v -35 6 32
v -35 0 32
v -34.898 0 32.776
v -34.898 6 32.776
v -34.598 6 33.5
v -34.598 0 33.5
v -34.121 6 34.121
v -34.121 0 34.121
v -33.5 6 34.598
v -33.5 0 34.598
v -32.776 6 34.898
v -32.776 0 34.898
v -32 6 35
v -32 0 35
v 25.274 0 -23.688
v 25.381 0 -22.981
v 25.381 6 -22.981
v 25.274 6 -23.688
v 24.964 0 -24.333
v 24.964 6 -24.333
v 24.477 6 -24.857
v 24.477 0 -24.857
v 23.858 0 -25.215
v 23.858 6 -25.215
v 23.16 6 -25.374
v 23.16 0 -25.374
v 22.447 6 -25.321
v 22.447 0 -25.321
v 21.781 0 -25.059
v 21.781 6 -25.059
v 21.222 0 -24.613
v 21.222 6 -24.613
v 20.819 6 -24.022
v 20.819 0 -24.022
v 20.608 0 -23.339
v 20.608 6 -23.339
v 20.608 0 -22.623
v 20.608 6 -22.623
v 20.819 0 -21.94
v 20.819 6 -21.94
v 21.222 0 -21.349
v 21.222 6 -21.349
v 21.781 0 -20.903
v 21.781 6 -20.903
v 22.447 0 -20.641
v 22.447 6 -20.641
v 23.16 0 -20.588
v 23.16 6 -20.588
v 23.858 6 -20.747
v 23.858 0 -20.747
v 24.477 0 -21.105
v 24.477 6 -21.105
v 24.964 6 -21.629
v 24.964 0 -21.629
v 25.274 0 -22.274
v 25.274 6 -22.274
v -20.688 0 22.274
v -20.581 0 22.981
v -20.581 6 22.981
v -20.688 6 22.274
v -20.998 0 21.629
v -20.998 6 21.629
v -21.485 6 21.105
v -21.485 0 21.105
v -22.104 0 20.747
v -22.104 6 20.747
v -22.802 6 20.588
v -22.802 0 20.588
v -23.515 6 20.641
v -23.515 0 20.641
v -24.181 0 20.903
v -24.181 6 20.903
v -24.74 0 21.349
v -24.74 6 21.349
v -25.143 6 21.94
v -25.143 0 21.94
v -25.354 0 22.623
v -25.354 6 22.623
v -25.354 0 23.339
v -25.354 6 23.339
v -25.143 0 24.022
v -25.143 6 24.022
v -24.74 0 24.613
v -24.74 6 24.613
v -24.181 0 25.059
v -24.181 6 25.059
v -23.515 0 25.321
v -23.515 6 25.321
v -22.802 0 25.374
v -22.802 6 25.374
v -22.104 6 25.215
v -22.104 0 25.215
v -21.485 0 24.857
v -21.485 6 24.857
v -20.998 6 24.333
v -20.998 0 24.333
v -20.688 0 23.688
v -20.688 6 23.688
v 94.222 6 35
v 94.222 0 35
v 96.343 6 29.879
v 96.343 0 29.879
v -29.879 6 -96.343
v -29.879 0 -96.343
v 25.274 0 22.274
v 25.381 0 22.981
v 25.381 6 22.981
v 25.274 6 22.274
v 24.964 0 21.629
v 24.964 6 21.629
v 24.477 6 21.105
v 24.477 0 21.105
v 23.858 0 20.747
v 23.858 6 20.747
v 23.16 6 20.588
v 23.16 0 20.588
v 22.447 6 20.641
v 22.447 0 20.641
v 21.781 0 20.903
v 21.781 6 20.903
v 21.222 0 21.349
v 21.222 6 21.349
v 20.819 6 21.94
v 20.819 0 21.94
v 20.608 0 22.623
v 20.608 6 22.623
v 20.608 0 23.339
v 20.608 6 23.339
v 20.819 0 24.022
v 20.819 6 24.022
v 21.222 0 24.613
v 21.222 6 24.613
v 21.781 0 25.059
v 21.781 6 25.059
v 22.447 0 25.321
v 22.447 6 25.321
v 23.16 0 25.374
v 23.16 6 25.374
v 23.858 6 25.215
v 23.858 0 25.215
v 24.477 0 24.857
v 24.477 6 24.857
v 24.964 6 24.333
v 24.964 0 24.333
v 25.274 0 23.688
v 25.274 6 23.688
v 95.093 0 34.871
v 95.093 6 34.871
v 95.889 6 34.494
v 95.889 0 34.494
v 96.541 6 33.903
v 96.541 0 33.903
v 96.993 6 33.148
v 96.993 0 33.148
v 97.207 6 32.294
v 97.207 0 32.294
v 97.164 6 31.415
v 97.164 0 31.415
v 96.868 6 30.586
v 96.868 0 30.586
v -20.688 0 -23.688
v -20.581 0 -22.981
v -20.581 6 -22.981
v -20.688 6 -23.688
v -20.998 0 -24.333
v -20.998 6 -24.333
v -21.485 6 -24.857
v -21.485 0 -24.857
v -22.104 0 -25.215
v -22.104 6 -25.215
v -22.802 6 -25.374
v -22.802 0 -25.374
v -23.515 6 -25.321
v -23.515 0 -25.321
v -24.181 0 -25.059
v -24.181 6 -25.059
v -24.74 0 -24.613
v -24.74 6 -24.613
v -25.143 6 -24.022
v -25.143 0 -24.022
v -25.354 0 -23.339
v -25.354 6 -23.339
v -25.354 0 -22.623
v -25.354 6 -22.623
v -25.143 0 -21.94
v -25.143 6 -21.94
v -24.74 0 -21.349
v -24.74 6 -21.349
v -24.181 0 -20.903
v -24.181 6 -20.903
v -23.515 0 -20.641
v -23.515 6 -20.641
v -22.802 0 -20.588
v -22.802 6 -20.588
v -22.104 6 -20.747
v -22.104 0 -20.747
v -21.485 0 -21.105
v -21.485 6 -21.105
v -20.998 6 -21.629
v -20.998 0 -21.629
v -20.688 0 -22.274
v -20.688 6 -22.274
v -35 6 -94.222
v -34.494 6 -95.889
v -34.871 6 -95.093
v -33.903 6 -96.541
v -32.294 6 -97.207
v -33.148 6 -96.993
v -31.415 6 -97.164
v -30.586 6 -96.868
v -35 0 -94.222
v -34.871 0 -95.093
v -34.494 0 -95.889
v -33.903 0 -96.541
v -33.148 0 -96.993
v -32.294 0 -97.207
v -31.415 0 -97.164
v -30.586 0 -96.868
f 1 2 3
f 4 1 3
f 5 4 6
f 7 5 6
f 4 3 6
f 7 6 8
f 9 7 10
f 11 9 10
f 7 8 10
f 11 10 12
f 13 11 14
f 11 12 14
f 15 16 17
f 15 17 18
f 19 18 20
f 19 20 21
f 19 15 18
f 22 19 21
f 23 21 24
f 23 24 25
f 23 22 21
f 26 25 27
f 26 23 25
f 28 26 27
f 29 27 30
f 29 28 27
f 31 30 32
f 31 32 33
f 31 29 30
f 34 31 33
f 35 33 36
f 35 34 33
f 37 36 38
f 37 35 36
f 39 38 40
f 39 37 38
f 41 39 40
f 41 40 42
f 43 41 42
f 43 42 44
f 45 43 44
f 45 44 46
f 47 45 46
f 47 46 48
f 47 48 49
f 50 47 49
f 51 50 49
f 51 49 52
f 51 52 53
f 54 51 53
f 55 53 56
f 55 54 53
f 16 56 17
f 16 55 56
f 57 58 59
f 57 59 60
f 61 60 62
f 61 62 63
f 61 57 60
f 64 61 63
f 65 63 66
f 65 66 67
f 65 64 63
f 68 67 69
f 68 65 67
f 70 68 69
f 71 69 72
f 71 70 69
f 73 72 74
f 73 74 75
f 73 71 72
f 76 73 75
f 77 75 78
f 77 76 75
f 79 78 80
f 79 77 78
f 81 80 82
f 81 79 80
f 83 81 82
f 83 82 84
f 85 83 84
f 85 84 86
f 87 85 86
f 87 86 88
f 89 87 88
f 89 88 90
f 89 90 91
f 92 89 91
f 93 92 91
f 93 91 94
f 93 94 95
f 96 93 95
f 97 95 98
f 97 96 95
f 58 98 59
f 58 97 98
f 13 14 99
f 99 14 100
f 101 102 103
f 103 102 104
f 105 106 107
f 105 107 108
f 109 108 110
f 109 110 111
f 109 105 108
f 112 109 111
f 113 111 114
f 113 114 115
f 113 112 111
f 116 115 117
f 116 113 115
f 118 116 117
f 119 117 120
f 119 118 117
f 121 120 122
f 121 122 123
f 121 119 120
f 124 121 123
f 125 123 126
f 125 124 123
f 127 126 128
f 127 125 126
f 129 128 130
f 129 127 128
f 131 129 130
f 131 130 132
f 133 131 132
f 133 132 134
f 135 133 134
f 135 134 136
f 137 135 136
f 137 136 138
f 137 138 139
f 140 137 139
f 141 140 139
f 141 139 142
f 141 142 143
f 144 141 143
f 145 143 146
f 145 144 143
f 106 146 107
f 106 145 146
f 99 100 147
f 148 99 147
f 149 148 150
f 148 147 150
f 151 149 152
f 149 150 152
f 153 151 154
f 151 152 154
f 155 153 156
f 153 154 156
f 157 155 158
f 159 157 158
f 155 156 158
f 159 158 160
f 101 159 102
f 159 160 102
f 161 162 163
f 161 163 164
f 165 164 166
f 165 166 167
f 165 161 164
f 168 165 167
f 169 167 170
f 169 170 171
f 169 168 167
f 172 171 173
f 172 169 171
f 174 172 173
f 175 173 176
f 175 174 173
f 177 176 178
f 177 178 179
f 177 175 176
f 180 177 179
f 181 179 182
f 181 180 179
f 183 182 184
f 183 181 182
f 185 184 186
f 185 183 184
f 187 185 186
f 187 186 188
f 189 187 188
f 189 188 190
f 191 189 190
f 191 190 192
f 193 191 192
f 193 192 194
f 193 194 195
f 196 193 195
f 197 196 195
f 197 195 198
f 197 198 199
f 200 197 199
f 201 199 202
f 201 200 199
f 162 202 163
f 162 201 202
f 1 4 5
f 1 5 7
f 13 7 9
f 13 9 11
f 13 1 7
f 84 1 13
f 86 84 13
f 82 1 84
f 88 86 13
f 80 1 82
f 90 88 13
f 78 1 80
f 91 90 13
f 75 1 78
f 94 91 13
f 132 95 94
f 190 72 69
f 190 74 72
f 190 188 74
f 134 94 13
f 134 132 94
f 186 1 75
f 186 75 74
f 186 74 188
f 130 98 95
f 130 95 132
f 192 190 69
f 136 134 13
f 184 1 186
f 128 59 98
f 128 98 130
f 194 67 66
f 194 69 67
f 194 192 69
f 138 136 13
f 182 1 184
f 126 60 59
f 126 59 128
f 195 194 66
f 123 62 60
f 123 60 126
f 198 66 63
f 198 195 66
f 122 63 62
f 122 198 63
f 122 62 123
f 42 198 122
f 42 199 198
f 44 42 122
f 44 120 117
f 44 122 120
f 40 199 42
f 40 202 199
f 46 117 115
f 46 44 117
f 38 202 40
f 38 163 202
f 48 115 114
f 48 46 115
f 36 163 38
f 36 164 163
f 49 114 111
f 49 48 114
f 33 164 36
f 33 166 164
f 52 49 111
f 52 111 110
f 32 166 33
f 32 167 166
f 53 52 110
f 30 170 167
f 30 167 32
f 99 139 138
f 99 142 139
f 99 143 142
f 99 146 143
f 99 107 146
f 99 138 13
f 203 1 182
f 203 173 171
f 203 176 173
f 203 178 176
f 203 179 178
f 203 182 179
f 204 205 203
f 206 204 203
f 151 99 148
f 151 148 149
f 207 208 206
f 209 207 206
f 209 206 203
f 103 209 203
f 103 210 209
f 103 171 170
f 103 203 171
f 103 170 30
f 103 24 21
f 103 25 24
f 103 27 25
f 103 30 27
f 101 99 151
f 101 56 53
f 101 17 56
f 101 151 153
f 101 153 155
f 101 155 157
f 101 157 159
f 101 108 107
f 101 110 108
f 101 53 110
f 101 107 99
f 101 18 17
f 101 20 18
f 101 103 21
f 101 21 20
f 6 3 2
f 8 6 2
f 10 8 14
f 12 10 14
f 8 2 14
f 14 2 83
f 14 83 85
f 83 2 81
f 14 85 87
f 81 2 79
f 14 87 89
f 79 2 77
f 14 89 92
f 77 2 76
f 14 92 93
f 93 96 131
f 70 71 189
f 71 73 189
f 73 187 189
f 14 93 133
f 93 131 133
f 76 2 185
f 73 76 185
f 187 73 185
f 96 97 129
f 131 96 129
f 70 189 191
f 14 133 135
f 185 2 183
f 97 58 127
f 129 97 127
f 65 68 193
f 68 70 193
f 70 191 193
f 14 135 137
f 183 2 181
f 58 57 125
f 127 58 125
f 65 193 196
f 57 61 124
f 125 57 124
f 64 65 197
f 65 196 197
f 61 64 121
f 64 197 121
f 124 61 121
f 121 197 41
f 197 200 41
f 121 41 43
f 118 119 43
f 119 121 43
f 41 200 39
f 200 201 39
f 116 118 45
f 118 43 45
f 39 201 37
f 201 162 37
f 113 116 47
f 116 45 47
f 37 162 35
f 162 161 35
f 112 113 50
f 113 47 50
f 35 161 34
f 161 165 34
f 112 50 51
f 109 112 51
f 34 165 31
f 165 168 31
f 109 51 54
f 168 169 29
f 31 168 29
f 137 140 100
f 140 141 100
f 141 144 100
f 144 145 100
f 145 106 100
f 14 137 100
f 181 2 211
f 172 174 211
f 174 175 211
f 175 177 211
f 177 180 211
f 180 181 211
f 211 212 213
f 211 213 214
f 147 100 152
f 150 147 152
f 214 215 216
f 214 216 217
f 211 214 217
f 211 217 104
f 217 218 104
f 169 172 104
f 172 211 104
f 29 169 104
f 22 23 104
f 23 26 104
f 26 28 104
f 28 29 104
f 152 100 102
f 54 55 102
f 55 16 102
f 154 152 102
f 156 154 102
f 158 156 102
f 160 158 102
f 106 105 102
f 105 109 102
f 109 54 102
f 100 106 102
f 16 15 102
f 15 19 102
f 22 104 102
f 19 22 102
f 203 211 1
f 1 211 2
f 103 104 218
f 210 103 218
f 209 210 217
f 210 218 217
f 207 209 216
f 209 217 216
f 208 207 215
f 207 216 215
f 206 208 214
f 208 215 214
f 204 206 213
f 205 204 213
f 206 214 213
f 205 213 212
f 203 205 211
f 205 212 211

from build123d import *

# Parameters (mm, degrees)
SKETCH1_R           = 2.4
BOSS_EXTRUDE1_DEPTH = 6


with BuildPart() as part:
    # Sketch1 → Boss-Extrude1 (new body)
    with BuildSketch(Plane(origin=(0, 0, 0), x_dir=(1, 0, 0), z_dir=(0, 1, 0))):
        with BuildLine():
            ThreePointArc((-35, -32), (-34.121320344, -34.121320344), (-32, -35))
            Line((-32, -35), (94.221825407, -35))
            ThreePointArc((94.221825407, -35), (96.993464004, -33.148050297), (96.343145751, -29.878679656))
            Line((96.343145751, -29.878679656), (-29.878679656, 96.343145751))
            ThreePointArc((-29.878679656, 96.343145751), (-33.148050297, 96.993464004), (-35, 94.221825407))
            Line((-35, 94.221825407), (-35, -32))
        make_face()
        with Locations((-22.980970389, -22.980970389)):
            Circle(SKETCH1_R, mode=Mode.SUBTRACT)
        with Locations((22.980970389, -22.980970389)):
            Circle(SKETCH1_R, mode=Mode.SUBTRACT)
        with Locations((-22.980970389, 22.980970389)):
            Circle(SKETCH1_R, mode=Mode.SUBTRACT)
        with Locations((22.980970389, 22.980970389)):
            Circle(SKETCH1_R, mode=Mode.SUBTRACT)
    extrude(amount=BOSS_EXTRUDE1_DEPTH)


solid = part.part
